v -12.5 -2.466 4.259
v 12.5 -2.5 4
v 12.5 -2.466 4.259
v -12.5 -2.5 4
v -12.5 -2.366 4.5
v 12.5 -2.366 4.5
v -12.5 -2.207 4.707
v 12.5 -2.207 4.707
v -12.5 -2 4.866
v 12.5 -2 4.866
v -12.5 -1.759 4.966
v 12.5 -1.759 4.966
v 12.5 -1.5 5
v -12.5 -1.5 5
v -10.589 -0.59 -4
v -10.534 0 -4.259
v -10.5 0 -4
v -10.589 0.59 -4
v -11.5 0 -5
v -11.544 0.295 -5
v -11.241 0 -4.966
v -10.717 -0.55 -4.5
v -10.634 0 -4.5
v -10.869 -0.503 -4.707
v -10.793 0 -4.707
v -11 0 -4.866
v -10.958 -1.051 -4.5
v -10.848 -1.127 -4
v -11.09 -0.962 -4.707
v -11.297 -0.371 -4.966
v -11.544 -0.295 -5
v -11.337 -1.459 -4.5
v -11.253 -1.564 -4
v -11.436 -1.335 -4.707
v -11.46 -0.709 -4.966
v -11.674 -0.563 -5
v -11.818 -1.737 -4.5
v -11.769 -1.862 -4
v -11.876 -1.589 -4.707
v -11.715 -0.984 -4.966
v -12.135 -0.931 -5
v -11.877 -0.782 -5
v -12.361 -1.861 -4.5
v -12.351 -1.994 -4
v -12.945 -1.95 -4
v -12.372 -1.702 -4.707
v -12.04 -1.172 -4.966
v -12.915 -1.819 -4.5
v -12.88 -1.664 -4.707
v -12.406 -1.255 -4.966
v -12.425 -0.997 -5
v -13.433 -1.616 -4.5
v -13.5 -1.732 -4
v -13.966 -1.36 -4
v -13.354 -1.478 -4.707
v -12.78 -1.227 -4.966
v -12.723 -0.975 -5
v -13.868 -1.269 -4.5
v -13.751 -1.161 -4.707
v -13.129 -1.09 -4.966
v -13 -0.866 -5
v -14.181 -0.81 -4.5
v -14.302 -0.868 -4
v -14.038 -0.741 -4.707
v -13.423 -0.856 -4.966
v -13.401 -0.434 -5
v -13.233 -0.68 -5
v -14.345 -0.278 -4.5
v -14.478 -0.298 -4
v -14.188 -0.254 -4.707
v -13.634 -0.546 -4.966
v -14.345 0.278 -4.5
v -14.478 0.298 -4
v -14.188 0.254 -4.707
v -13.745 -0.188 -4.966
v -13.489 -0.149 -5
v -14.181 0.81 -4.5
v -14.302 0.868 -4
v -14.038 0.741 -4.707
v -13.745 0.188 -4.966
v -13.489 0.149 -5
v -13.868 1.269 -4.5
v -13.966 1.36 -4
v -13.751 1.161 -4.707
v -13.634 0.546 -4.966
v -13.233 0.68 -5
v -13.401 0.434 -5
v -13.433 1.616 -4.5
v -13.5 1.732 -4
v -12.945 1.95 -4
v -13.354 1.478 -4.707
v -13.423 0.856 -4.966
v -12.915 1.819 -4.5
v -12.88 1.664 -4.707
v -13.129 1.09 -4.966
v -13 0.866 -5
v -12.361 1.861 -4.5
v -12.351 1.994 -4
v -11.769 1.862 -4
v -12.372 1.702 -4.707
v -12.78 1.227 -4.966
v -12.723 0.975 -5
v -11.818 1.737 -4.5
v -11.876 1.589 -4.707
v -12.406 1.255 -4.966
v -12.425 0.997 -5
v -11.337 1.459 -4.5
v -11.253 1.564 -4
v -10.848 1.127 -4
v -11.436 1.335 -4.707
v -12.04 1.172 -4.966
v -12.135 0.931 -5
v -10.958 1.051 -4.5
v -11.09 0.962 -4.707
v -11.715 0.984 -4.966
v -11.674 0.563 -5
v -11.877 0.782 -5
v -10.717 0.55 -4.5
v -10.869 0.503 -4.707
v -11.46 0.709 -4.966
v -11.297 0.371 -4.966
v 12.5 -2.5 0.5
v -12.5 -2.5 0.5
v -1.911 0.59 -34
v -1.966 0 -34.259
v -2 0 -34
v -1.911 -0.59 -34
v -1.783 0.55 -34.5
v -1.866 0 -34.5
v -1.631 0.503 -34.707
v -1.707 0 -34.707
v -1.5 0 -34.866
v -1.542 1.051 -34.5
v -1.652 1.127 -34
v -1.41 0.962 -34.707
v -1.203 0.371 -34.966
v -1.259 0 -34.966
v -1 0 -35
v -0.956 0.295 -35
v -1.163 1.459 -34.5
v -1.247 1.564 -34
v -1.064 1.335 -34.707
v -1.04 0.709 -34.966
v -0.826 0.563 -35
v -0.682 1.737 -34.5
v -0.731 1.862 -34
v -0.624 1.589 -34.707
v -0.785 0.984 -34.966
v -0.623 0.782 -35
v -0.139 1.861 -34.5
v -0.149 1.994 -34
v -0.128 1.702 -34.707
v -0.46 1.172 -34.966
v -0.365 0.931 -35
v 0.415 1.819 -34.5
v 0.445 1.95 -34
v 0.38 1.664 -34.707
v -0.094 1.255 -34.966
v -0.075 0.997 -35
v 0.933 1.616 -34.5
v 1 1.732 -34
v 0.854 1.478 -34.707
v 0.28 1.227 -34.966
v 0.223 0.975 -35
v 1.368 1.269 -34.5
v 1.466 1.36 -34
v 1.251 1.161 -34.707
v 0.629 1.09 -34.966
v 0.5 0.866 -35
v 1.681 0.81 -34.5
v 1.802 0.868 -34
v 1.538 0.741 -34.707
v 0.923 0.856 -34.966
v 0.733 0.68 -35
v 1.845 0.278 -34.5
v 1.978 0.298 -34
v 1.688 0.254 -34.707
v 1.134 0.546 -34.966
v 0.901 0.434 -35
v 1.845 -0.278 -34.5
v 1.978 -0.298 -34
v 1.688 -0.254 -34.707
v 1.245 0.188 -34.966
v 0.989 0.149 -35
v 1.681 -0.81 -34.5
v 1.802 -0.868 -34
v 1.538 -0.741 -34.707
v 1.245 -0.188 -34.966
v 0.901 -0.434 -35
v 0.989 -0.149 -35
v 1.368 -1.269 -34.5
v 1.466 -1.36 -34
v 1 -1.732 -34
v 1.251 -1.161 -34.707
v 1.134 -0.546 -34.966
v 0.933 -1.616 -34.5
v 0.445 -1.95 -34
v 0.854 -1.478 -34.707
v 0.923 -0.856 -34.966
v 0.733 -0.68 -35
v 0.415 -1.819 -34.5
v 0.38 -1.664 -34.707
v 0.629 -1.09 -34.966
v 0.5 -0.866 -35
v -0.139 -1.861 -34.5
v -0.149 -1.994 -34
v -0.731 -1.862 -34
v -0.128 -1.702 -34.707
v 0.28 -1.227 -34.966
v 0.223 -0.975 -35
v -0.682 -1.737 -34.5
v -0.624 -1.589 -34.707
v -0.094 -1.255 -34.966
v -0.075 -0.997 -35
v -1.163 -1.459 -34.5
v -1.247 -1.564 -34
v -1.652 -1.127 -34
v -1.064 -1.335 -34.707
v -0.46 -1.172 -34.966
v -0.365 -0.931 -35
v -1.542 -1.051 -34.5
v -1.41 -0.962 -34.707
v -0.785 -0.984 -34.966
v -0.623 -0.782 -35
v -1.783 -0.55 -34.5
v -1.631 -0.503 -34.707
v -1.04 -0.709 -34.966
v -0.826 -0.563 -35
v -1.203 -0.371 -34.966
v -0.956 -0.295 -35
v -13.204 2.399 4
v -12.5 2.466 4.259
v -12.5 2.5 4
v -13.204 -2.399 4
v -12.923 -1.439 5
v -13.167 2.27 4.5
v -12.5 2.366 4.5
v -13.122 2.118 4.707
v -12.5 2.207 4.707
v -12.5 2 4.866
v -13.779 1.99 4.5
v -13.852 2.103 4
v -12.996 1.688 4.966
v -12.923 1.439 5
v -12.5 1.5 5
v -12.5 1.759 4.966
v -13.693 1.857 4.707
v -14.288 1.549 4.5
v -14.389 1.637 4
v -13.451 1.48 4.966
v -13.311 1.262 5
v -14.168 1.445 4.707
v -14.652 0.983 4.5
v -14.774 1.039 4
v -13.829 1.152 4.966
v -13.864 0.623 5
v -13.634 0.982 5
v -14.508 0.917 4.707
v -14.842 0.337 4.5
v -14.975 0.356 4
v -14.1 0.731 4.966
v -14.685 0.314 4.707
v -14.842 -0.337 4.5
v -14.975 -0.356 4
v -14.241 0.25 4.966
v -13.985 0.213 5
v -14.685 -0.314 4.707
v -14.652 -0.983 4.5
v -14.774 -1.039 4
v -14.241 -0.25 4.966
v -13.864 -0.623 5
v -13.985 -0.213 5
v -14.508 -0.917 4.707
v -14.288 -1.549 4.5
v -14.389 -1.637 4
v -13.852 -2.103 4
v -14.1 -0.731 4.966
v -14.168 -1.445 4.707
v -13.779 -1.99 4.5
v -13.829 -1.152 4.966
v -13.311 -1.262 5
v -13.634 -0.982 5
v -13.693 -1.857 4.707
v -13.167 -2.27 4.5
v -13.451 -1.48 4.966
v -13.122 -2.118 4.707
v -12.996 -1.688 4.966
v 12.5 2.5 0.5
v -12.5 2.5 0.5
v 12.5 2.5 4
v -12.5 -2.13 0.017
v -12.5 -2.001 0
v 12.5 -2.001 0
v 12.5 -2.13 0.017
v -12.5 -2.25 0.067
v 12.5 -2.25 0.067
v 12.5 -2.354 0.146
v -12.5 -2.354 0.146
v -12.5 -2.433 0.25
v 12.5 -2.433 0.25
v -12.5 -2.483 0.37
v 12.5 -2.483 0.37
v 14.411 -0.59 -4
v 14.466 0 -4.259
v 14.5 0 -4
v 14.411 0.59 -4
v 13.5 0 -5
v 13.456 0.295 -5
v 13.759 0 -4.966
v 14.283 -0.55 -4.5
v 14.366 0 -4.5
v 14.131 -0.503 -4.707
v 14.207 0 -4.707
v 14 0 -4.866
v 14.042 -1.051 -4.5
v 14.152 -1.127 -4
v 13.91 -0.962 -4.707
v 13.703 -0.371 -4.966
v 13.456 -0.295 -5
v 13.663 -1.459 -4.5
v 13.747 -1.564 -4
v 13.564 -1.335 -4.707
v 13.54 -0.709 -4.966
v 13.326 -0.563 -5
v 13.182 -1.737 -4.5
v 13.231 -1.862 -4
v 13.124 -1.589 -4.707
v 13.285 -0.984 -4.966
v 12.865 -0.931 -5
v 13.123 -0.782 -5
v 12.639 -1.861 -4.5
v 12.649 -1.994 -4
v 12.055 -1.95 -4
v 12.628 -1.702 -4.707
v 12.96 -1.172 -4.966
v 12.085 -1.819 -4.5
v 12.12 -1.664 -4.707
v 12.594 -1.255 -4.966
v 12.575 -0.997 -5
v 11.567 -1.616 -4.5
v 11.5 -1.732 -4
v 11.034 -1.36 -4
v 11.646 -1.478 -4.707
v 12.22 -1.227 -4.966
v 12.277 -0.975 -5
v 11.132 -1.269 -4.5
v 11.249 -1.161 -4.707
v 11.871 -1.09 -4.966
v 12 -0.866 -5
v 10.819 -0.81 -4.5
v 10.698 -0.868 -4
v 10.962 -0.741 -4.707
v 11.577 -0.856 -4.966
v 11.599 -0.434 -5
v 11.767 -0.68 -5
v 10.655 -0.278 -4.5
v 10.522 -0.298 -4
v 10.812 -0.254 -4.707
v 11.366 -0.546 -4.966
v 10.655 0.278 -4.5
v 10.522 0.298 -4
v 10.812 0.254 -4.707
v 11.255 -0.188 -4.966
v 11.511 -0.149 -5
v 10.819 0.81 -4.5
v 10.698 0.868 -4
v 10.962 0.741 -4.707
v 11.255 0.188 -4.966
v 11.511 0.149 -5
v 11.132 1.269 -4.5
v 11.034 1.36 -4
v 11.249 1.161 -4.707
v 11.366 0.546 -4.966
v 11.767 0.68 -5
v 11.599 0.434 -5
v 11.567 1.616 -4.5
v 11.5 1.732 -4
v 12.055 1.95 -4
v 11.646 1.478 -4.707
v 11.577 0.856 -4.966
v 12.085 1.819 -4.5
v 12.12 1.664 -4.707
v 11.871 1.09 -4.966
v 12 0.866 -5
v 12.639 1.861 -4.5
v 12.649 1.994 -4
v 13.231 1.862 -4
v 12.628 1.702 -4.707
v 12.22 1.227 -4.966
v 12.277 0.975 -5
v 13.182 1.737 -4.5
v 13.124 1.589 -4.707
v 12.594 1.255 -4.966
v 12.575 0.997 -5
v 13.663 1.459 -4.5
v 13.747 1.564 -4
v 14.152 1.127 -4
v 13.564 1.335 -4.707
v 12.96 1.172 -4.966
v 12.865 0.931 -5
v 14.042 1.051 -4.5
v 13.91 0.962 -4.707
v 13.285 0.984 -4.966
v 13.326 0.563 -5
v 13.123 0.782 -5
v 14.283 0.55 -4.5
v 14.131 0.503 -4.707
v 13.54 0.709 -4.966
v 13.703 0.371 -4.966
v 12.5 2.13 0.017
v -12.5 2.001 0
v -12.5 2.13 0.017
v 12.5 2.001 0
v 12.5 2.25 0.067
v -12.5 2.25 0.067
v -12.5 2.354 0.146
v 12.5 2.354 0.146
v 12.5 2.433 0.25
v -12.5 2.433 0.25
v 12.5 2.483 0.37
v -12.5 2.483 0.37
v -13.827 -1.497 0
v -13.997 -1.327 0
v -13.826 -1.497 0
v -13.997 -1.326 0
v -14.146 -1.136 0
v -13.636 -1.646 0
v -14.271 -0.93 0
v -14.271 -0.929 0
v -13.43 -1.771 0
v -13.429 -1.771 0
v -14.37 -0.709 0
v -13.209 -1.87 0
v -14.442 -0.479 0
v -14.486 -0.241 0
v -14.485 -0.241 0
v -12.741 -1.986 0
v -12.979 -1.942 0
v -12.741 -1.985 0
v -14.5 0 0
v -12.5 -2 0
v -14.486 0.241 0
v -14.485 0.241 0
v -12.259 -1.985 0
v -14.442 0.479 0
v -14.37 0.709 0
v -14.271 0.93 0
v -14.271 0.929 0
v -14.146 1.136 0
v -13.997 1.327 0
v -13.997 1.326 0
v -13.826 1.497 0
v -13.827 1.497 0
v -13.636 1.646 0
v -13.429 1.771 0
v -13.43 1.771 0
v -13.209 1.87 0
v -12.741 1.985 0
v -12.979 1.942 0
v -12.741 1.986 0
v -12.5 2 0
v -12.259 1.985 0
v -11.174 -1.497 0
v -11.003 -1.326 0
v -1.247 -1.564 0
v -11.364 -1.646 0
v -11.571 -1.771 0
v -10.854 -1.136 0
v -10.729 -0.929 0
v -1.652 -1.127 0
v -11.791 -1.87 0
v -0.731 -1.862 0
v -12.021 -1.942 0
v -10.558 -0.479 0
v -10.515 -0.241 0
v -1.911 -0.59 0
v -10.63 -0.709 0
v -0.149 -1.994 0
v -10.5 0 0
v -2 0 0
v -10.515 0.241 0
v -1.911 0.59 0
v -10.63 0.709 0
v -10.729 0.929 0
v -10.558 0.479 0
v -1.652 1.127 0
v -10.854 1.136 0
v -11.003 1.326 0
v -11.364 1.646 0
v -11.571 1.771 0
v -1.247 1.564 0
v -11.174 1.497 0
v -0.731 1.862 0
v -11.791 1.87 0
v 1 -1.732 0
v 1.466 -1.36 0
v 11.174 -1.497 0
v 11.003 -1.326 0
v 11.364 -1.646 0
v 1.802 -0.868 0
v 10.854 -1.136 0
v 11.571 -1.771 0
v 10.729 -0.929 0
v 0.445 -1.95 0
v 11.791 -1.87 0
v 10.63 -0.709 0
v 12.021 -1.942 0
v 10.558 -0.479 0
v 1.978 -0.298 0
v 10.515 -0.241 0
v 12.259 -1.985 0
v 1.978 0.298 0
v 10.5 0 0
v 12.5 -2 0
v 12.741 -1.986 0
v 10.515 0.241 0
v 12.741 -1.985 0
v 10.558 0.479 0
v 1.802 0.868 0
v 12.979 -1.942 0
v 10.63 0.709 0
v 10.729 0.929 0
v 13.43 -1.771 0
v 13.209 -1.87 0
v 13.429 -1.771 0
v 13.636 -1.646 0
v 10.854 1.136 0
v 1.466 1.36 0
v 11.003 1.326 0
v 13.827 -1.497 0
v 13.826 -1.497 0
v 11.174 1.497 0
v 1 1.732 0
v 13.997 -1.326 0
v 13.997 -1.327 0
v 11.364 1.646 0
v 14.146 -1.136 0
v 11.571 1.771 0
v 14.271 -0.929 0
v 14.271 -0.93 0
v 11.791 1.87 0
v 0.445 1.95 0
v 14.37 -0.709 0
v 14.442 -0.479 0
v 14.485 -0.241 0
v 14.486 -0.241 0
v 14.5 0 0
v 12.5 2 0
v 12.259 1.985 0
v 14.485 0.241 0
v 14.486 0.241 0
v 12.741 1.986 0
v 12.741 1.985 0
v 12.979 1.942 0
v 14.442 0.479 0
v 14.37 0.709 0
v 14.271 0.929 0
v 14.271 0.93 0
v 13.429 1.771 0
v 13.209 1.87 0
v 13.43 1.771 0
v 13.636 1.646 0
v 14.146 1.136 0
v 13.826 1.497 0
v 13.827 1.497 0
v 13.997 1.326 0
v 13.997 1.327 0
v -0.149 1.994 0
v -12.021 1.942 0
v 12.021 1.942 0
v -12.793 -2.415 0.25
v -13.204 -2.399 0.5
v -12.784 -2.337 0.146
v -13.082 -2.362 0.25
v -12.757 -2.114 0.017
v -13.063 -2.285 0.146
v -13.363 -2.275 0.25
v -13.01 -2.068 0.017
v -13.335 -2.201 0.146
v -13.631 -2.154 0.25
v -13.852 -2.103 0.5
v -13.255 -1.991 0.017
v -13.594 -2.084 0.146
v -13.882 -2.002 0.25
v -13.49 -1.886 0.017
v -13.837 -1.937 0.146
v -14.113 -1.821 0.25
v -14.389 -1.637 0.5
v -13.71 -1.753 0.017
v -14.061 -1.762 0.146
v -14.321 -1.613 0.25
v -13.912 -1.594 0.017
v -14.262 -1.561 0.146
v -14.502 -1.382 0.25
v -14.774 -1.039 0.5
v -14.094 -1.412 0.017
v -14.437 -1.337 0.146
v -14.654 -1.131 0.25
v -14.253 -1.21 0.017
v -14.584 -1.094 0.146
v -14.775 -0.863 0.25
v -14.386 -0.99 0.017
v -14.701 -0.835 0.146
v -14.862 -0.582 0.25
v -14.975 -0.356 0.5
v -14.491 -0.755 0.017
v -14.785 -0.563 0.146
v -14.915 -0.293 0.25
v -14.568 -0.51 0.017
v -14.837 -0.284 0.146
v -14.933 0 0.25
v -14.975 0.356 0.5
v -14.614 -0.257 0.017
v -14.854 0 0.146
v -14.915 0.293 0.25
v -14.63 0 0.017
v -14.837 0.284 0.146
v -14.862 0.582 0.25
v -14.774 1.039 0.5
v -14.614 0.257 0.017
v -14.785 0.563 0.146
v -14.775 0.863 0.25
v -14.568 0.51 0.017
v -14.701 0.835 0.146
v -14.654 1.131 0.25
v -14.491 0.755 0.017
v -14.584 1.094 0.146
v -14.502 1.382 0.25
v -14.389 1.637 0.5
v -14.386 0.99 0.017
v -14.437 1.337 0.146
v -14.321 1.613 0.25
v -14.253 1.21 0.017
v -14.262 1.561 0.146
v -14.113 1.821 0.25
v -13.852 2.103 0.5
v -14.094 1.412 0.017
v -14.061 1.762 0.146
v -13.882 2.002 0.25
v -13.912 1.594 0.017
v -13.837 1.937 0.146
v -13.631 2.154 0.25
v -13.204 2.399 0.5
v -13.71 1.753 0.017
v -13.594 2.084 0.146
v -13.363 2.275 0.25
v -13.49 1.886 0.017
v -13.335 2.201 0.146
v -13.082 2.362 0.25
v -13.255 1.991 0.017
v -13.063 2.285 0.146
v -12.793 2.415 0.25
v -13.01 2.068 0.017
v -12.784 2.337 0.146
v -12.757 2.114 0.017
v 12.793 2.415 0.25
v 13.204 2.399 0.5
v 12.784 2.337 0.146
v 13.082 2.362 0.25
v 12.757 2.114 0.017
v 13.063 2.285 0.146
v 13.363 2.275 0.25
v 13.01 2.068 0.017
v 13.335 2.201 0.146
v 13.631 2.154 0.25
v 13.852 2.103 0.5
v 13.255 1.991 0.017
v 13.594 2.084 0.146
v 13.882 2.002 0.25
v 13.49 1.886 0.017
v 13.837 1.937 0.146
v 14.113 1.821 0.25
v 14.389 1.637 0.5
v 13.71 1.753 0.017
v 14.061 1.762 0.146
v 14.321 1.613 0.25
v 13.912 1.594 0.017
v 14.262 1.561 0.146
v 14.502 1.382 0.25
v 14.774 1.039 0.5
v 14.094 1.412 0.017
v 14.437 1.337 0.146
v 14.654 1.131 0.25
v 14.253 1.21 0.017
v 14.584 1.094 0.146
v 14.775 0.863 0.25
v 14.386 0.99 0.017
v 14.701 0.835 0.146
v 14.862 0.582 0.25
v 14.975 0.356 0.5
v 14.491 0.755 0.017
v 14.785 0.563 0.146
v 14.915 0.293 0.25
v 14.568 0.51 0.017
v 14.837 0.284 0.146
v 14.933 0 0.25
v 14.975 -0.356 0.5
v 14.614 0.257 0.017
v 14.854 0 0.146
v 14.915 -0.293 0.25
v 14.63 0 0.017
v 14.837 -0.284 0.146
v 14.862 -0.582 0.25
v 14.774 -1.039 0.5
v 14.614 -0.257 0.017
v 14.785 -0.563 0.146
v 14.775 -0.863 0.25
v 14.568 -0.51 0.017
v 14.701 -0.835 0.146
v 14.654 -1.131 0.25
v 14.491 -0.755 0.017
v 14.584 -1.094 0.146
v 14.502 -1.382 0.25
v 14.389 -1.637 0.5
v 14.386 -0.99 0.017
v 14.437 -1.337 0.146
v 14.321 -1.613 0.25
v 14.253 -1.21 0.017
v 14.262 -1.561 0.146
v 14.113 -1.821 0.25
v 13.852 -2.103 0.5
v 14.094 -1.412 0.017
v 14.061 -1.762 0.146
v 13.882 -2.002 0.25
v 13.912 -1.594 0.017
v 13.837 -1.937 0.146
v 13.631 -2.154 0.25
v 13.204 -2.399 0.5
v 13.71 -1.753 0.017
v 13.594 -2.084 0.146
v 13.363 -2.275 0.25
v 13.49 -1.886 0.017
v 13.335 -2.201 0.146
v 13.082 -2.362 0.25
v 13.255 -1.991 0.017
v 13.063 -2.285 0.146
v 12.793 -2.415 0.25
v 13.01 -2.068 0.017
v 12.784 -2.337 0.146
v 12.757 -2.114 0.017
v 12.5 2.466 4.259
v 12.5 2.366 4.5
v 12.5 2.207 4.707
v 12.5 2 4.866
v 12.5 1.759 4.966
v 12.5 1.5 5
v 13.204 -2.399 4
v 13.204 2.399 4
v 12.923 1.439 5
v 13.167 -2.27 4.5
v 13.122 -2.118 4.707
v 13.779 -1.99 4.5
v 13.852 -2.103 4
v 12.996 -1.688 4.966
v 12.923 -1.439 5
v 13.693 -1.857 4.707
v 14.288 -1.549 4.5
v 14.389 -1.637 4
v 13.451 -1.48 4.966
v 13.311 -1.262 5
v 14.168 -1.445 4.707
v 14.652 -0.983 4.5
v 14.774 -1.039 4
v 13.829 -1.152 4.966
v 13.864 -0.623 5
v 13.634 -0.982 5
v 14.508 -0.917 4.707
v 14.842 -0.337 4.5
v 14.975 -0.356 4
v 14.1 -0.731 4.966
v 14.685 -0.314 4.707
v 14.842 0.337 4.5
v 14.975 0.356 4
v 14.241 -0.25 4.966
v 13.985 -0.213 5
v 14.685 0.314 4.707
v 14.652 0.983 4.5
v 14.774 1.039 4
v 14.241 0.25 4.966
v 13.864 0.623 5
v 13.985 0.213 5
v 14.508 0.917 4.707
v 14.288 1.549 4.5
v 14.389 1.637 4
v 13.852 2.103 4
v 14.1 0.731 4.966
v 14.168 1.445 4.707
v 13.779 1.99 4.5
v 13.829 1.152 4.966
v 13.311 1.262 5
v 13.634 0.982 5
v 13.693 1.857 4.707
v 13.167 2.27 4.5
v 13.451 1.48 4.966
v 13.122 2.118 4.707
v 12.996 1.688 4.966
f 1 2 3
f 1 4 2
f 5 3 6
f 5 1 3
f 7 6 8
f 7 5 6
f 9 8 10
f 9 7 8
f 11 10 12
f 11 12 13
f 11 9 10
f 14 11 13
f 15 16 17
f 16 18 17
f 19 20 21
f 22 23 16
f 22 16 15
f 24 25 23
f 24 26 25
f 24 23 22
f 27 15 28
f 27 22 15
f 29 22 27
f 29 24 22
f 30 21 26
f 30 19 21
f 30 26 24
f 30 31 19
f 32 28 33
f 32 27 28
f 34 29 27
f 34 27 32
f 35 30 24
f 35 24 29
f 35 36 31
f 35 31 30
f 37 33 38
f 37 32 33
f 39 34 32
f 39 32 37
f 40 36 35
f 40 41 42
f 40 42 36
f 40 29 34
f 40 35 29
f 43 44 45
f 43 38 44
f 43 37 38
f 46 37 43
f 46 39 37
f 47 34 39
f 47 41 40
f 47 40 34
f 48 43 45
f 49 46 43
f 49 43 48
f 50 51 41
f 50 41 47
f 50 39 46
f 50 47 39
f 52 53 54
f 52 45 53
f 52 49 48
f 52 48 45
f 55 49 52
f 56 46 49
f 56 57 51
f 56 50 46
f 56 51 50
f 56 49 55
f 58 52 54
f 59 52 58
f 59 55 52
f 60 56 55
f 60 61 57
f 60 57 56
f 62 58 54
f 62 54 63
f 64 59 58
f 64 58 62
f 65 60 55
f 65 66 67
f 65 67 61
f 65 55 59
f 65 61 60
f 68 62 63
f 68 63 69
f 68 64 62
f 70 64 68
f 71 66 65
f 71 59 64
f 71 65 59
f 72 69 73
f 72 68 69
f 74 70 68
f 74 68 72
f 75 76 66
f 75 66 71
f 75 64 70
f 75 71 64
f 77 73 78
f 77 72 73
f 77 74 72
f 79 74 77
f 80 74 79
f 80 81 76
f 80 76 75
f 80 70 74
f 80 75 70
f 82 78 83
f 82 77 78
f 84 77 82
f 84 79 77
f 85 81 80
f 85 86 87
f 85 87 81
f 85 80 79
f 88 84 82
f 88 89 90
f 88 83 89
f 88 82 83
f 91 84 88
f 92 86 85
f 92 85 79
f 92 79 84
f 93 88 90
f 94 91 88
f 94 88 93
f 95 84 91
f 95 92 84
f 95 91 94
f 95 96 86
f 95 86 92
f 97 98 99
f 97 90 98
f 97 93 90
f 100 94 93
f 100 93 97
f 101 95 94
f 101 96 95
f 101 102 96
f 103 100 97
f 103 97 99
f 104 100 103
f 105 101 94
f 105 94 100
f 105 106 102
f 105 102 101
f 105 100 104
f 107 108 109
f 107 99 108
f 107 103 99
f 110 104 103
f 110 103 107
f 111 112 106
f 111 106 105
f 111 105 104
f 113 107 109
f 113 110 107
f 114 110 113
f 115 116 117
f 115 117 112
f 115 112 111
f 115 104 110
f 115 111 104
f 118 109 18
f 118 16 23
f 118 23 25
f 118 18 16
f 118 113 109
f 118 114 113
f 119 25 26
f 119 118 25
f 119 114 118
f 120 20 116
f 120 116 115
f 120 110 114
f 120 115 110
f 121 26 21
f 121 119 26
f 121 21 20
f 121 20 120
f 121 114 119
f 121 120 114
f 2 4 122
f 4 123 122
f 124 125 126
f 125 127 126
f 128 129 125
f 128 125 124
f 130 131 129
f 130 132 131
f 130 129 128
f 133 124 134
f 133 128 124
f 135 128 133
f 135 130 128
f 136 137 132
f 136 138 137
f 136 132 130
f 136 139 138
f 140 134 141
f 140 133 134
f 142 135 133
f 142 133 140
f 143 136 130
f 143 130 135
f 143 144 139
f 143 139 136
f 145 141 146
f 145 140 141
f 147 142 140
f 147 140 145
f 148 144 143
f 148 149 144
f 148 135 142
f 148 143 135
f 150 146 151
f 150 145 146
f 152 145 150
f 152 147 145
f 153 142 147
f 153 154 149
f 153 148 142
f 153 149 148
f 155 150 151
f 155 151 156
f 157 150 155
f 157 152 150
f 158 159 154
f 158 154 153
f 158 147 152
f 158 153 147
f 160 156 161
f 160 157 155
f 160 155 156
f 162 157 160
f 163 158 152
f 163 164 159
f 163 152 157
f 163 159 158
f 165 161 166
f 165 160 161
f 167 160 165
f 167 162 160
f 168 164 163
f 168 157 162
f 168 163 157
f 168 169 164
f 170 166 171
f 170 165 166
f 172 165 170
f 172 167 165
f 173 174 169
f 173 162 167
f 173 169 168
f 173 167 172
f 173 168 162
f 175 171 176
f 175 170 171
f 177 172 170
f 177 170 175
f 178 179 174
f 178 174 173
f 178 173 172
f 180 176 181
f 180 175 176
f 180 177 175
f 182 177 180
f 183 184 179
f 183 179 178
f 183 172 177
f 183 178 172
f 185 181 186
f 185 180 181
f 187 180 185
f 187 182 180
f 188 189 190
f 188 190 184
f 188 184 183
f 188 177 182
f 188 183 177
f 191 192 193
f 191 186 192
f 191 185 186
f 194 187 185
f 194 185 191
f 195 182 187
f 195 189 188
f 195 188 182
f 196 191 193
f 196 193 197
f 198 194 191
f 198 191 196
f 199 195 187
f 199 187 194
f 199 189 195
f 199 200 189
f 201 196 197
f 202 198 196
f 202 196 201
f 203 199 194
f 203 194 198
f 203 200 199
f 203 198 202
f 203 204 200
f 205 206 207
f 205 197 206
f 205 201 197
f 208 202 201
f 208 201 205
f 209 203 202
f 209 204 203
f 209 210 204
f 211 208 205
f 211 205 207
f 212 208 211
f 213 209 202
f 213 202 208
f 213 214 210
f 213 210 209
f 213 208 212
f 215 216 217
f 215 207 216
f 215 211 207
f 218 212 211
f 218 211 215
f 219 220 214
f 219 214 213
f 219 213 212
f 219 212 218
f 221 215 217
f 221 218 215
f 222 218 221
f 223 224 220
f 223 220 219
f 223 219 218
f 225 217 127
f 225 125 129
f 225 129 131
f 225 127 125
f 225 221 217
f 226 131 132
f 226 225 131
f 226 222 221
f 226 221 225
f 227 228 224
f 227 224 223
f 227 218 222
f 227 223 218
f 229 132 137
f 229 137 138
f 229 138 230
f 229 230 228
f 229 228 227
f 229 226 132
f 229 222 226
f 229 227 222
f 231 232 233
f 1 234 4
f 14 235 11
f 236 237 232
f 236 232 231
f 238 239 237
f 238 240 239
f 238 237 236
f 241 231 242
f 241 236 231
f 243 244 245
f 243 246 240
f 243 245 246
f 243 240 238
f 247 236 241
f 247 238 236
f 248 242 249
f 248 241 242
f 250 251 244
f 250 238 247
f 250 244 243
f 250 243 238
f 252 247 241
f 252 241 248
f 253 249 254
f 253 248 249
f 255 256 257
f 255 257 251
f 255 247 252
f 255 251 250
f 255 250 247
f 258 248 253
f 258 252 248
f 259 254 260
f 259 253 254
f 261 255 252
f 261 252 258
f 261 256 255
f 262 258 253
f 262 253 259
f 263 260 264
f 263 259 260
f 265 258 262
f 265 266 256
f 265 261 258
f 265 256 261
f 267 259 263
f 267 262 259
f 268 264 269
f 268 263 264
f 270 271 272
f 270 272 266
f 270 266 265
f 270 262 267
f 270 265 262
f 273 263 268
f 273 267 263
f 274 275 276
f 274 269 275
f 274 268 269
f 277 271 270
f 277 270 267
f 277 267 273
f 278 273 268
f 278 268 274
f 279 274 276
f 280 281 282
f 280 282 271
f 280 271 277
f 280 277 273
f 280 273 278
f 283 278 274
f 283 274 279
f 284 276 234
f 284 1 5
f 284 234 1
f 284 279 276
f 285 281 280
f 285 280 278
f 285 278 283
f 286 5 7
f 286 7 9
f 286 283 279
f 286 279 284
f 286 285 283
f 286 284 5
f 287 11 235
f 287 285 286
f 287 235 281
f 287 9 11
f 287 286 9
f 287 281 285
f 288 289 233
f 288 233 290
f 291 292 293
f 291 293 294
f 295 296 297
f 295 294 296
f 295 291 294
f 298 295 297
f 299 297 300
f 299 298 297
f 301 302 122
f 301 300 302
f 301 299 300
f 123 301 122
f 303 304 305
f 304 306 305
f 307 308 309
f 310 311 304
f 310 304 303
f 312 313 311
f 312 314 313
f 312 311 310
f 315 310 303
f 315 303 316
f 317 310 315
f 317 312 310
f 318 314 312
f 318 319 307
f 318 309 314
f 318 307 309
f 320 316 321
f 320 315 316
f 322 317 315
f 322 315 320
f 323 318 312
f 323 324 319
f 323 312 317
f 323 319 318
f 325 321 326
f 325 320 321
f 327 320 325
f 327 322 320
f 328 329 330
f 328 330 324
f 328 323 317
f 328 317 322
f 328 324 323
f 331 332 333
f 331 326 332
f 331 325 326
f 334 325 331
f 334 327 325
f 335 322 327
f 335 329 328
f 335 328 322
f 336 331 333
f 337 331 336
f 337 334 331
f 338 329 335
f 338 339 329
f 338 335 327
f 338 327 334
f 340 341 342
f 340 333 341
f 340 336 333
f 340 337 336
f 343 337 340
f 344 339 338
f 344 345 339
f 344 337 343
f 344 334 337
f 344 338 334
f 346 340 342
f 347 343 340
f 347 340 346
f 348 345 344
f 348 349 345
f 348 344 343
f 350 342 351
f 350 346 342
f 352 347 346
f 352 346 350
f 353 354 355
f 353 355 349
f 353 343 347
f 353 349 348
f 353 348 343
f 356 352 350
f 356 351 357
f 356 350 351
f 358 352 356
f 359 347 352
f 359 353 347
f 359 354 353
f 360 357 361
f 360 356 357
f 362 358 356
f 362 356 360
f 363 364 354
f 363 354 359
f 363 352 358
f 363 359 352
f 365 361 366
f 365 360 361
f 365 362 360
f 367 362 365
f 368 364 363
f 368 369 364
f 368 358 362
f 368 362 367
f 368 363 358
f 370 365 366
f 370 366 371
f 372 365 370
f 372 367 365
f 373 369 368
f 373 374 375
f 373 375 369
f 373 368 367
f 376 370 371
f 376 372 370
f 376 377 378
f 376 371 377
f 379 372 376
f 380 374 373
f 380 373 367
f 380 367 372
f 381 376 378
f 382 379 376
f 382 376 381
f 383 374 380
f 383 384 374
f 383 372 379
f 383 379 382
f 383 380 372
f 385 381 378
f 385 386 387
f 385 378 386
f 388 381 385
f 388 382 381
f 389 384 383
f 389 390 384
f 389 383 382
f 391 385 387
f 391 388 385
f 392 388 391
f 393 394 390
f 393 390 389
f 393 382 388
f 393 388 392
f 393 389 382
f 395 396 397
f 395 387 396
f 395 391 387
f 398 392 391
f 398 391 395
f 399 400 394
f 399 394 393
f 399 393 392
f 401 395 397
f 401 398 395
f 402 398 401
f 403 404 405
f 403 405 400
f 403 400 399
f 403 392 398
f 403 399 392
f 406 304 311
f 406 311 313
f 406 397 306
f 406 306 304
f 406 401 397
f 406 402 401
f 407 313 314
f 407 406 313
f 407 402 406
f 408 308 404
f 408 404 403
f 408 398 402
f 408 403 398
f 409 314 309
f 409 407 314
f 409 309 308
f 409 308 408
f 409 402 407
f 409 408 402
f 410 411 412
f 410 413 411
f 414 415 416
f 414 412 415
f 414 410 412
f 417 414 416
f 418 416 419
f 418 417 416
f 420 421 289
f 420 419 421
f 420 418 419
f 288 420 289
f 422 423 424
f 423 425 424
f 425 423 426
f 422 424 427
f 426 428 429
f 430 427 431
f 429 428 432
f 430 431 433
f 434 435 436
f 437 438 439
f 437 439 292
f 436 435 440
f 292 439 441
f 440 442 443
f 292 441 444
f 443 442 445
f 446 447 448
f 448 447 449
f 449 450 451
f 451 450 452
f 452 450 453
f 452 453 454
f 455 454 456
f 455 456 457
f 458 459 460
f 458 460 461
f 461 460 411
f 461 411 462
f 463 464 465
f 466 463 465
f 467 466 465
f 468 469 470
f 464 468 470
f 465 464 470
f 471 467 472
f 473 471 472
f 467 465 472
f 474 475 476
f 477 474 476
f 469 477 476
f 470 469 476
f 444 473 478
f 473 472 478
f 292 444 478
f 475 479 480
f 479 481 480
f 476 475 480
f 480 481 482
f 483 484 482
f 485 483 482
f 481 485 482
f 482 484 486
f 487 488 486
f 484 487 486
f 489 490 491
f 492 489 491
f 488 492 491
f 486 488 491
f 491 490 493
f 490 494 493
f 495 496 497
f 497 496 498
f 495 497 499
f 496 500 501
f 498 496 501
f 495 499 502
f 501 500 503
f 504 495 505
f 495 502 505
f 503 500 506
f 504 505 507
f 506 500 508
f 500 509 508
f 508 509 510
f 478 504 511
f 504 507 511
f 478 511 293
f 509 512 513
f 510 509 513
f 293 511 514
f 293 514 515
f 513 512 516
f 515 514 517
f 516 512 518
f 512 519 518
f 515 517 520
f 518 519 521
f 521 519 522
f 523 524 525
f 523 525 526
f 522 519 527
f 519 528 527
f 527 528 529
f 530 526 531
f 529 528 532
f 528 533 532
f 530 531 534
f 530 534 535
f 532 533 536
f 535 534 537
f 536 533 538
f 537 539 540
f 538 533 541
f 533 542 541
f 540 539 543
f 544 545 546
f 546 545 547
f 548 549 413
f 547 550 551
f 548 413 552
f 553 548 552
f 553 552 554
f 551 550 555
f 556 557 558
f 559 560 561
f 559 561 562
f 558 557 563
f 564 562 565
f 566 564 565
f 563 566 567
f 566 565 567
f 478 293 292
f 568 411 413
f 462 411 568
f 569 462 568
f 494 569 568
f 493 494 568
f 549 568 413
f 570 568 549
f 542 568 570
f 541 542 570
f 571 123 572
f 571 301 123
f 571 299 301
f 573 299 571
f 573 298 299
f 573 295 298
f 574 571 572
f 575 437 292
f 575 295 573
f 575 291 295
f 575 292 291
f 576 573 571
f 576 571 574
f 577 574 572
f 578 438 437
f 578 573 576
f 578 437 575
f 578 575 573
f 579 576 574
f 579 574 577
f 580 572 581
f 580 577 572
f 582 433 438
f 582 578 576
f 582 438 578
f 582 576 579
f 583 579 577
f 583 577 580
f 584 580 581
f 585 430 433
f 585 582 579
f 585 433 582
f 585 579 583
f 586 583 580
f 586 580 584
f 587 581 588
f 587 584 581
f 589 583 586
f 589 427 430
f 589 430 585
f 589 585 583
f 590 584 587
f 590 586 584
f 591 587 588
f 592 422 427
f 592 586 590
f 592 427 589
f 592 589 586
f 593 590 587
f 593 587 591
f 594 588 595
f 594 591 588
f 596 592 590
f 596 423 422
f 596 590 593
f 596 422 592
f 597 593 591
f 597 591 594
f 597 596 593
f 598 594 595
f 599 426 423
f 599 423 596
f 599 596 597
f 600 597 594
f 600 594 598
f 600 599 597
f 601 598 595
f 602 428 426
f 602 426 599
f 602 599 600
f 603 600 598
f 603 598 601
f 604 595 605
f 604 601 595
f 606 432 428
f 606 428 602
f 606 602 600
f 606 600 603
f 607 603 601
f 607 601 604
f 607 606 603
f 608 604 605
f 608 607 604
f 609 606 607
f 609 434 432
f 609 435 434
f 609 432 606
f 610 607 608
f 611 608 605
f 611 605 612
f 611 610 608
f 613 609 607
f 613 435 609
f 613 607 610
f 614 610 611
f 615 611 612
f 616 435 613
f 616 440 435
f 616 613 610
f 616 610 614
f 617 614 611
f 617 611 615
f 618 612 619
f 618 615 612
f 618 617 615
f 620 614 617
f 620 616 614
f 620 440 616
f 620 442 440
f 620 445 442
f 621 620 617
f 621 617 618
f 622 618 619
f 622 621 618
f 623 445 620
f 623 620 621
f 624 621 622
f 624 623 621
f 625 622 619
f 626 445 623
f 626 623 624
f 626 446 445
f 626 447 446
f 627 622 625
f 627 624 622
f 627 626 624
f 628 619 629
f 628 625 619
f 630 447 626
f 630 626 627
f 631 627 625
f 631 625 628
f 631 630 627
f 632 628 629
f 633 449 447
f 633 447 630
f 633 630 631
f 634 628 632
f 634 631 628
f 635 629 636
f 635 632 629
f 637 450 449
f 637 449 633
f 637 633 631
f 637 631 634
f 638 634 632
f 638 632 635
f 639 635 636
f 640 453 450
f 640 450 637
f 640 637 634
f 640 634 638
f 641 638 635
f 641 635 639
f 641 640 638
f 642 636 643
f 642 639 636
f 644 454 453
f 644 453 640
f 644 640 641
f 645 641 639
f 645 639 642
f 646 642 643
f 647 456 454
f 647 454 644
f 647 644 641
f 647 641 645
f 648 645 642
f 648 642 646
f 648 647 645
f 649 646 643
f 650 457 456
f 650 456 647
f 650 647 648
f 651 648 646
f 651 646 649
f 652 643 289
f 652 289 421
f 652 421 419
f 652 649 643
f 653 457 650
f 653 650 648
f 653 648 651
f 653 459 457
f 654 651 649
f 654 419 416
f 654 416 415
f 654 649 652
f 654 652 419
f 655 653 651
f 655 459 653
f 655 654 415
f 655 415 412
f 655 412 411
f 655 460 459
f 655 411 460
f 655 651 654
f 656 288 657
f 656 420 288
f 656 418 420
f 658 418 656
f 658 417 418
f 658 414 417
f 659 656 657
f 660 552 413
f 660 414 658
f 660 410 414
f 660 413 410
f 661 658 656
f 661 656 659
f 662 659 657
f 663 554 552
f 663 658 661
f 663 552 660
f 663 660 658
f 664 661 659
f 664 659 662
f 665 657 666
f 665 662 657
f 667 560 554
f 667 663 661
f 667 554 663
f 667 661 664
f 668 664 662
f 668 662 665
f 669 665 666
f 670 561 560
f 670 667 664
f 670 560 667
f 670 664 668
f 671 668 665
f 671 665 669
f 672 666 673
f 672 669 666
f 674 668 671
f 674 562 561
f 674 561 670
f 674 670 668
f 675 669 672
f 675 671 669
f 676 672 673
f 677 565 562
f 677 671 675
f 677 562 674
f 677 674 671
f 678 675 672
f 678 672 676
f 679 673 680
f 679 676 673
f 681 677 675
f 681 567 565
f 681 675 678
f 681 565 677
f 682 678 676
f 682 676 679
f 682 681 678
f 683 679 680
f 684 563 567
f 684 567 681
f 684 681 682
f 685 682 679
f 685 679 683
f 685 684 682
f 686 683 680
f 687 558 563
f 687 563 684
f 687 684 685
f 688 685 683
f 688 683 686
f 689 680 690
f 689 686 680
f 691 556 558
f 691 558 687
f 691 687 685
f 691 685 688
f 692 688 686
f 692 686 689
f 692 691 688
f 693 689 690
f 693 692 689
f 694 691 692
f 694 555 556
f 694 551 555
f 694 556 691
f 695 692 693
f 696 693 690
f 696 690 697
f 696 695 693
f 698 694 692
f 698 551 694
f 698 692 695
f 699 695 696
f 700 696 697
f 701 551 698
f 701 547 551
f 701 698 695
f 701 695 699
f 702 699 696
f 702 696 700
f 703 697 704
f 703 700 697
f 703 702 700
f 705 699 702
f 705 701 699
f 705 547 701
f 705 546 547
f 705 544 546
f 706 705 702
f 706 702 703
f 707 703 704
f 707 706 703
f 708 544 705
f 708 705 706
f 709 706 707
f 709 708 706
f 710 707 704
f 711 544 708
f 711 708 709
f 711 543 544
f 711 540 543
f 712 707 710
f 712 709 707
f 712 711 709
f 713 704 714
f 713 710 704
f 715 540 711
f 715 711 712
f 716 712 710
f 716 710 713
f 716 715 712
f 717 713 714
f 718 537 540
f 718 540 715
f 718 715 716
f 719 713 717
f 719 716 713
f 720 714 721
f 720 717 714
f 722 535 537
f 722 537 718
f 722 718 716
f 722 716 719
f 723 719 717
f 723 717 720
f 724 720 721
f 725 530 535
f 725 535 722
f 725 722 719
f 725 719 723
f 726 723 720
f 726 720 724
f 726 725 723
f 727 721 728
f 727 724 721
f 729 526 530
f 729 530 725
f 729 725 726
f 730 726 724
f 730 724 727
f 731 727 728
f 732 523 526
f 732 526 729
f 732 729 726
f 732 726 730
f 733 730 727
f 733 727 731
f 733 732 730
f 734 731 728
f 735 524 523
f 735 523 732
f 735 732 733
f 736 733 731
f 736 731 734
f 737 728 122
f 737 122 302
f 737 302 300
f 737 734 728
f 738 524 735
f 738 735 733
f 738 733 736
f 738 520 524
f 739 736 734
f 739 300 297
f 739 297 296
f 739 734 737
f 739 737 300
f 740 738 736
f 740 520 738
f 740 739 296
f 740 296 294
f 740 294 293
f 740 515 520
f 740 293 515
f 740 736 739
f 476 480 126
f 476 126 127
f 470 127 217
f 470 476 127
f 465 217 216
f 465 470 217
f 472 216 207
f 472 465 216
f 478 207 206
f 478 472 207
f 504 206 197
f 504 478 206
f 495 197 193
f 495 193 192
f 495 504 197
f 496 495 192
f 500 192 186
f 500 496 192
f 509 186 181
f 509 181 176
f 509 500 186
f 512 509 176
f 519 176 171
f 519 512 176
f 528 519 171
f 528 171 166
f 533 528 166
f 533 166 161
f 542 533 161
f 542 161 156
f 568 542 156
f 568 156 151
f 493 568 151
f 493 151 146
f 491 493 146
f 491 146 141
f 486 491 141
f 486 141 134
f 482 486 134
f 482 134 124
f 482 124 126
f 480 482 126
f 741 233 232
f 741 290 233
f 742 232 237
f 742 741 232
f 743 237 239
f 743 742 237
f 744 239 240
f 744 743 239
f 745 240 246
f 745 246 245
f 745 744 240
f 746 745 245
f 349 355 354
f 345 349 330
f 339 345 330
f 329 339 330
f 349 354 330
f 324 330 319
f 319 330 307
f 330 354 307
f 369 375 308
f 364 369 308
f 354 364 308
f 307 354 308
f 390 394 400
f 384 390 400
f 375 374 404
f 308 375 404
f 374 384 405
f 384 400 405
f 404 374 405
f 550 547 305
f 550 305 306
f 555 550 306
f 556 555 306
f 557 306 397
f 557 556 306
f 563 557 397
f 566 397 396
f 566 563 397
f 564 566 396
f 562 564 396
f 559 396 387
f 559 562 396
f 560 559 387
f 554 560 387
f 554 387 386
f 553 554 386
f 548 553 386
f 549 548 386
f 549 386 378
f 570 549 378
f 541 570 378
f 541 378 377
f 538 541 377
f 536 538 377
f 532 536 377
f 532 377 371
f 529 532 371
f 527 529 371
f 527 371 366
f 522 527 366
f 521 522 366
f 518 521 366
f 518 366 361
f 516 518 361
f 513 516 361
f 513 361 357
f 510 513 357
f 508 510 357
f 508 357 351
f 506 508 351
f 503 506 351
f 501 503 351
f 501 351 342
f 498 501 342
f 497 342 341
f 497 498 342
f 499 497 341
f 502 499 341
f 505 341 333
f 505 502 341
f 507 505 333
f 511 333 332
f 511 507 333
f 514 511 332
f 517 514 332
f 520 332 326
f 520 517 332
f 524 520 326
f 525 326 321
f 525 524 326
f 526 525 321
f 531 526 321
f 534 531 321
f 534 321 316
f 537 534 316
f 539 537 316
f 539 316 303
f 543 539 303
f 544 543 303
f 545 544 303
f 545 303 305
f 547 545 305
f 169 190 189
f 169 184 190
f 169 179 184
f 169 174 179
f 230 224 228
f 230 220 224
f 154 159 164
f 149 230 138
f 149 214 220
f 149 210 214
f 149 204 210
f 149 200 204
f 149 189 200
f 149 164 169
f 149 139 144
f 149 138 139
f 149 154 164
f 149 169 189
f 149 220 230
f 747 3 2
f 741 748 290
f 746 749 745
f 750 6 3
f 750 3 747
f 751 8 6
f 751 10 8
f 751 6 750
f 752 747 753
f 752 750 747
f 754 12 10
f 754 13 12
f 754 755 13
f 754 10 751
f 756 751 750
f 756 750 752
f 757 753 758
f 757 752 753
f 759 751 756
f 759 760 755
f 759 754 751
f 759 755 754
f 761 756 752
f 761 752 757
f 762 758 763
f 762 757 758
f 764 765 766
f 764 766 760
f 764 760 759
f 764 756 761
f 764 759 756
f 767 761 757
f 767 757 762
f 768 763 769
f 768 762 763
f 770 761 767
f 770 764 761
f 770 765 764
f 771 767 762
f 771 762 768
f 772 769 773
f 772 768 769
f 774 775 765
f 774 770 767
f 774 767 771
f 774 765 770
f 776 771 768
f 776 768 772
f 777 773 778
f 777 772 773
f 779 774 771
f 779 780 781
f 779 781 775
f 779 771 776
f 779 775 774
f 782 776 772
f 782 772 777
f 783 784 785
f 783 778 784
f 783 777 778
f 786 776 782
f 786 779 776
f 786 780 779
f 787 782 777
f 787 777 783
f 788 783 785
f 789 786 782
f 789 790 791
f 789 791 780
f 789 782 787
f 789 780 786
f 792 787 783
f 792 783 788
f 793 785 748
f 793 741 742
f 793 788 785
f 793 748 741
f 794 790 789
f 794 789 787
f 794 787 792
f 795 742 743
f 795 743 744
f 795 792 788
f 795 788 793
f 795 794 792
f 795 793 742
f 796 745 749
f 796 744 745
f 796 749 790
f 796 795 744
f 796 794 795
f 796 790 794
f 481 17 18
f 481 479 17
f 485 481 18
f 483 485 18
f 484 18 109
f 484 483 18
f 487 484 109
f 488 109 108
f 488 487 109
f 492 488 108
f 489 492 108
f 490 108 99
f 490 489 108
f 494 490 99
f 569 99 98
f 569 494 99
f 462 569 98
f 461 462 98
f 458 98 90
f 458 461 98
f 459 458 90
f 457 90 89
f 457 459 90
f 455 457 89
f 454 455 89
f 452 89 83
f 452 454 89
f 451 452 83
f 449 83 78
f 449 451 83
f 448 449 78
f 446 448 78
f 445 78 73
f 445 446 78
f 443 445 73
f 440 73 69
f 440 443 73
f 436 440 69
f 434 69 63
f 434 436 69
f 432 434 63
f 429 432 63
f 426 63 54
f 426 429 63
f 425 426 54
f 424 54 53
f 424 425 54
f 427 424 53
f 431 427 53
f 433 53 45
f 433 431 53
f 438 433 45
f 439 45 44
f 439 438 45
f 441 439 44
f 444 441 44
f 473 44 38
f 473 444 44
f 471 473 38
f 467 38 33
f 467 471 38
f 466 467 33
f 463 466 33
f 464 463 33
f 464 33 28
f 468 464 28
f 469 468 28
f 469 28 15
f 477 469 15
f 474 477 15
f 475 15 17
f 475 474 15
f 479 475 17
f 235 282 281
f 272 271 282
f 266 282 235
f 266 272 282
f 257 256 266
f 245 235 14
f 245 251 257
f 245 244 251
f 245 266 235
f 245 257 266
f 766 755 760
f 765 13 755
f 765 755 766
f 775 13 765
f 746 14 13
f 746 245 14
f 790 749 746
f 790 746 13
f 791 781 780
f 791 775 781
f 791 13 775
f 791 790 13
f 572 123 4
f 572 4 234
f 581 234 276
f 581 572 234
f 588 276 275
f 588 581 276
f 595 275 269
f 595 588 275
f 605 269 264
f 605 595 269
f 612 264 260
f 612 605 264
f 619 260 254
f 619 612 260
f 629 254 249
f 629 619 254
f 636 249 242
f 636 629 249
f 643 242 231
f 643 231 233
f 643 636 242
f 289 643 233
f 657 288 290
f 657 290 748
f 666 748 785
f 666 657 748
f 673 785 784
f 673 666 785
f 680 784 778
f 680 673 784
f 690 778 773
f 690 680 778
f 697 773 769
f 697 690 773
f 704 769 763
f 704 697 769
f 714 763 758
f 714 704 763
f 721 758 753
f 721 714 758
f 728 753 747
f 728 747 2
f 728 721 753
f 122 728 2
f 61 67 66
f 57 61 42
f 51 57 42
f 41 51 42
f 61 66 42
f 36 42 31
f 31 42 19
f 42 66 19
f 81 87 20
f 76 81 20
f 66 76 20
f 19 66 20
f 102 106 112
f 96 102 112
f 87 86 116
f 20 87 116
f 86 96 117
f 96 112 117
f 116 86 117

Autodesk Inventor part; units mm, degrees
ref_plane "YZ Plane" through (0, 0, 0) normal (1, 0, 0) x (0, 1, 0)
ref_plane "XZ Plane" through (0, 0, 0) normal (0, 1, 0) x (-1, 0, 0)
ref_plane "XY Plane" through (0, 0, 0) normal (0, 0, 1) x (1, 0, 0)
sketch "Sketch1" plane through (0, 0, 0) normal (0, 0, 1) x (1, 0, 0)
  circle A0 centre (-12.5, 0) radius 2
  line L0 (0, -3.5) -> (0, 3.5) projected
  line L1 (-21, 0) -> (21, 0) projected
  arc A1 (-12.5, 2.5) -> (-12.5, -2.5) centre (-12.5, 0) ccw
  circle A2 centre (12.5, 0) radius 2
  arc A3 (12.5, -2.5) -> (12.5, 2.5) centre (12.5, 0) ccw
  line L2 (-12.5, 2.5) -> (12.5, 2.5)
  line L3 (-12.5, -2.5) -> (12.5, -2.5)
  point P0 (0, 0)
  dimension "d0" = 4
  dimension "d2" = 5
  dimension "d3" = 25
extrude "Extrusion1" add sketch "Sketch1" along normal blind 5
extrude "Extrusion2" add sketch "Sketch1" against normal blind 5 contours L1 A0 | A0 L1 | A2 L1 | L1 A2
sketch "Sketch2" plane through (0, 0, 0) normal (0, 0, -1) x (-1, 0, 0)
  circle A0 centre (0, 0) radius 2
  line L0 (0, -3.5996) -> (0, 4.0974) projected
  line L1 (21, 0) -> (-21, 0) projected
  dimension "d8" = 4
extrude "Extrusion3" add sketch "Sketch2" along normal blind 35
fillet "Fillet1" radius 1 7 edges at (2, 0, -35) (10.5, 0, -5) (-14.5, 0, -5) (-15, 0, 5) (0, -2.5, 5) (15, 0, 5) (0, 2.5, 5)
fillet "Fillet2" radius 0.5 4 edges at (-15, 0, 0) (0, -2.5, 0) (15, 0, 0) (0, 2.5, 0)
properties part number "Steering Mounting Plate 3"
